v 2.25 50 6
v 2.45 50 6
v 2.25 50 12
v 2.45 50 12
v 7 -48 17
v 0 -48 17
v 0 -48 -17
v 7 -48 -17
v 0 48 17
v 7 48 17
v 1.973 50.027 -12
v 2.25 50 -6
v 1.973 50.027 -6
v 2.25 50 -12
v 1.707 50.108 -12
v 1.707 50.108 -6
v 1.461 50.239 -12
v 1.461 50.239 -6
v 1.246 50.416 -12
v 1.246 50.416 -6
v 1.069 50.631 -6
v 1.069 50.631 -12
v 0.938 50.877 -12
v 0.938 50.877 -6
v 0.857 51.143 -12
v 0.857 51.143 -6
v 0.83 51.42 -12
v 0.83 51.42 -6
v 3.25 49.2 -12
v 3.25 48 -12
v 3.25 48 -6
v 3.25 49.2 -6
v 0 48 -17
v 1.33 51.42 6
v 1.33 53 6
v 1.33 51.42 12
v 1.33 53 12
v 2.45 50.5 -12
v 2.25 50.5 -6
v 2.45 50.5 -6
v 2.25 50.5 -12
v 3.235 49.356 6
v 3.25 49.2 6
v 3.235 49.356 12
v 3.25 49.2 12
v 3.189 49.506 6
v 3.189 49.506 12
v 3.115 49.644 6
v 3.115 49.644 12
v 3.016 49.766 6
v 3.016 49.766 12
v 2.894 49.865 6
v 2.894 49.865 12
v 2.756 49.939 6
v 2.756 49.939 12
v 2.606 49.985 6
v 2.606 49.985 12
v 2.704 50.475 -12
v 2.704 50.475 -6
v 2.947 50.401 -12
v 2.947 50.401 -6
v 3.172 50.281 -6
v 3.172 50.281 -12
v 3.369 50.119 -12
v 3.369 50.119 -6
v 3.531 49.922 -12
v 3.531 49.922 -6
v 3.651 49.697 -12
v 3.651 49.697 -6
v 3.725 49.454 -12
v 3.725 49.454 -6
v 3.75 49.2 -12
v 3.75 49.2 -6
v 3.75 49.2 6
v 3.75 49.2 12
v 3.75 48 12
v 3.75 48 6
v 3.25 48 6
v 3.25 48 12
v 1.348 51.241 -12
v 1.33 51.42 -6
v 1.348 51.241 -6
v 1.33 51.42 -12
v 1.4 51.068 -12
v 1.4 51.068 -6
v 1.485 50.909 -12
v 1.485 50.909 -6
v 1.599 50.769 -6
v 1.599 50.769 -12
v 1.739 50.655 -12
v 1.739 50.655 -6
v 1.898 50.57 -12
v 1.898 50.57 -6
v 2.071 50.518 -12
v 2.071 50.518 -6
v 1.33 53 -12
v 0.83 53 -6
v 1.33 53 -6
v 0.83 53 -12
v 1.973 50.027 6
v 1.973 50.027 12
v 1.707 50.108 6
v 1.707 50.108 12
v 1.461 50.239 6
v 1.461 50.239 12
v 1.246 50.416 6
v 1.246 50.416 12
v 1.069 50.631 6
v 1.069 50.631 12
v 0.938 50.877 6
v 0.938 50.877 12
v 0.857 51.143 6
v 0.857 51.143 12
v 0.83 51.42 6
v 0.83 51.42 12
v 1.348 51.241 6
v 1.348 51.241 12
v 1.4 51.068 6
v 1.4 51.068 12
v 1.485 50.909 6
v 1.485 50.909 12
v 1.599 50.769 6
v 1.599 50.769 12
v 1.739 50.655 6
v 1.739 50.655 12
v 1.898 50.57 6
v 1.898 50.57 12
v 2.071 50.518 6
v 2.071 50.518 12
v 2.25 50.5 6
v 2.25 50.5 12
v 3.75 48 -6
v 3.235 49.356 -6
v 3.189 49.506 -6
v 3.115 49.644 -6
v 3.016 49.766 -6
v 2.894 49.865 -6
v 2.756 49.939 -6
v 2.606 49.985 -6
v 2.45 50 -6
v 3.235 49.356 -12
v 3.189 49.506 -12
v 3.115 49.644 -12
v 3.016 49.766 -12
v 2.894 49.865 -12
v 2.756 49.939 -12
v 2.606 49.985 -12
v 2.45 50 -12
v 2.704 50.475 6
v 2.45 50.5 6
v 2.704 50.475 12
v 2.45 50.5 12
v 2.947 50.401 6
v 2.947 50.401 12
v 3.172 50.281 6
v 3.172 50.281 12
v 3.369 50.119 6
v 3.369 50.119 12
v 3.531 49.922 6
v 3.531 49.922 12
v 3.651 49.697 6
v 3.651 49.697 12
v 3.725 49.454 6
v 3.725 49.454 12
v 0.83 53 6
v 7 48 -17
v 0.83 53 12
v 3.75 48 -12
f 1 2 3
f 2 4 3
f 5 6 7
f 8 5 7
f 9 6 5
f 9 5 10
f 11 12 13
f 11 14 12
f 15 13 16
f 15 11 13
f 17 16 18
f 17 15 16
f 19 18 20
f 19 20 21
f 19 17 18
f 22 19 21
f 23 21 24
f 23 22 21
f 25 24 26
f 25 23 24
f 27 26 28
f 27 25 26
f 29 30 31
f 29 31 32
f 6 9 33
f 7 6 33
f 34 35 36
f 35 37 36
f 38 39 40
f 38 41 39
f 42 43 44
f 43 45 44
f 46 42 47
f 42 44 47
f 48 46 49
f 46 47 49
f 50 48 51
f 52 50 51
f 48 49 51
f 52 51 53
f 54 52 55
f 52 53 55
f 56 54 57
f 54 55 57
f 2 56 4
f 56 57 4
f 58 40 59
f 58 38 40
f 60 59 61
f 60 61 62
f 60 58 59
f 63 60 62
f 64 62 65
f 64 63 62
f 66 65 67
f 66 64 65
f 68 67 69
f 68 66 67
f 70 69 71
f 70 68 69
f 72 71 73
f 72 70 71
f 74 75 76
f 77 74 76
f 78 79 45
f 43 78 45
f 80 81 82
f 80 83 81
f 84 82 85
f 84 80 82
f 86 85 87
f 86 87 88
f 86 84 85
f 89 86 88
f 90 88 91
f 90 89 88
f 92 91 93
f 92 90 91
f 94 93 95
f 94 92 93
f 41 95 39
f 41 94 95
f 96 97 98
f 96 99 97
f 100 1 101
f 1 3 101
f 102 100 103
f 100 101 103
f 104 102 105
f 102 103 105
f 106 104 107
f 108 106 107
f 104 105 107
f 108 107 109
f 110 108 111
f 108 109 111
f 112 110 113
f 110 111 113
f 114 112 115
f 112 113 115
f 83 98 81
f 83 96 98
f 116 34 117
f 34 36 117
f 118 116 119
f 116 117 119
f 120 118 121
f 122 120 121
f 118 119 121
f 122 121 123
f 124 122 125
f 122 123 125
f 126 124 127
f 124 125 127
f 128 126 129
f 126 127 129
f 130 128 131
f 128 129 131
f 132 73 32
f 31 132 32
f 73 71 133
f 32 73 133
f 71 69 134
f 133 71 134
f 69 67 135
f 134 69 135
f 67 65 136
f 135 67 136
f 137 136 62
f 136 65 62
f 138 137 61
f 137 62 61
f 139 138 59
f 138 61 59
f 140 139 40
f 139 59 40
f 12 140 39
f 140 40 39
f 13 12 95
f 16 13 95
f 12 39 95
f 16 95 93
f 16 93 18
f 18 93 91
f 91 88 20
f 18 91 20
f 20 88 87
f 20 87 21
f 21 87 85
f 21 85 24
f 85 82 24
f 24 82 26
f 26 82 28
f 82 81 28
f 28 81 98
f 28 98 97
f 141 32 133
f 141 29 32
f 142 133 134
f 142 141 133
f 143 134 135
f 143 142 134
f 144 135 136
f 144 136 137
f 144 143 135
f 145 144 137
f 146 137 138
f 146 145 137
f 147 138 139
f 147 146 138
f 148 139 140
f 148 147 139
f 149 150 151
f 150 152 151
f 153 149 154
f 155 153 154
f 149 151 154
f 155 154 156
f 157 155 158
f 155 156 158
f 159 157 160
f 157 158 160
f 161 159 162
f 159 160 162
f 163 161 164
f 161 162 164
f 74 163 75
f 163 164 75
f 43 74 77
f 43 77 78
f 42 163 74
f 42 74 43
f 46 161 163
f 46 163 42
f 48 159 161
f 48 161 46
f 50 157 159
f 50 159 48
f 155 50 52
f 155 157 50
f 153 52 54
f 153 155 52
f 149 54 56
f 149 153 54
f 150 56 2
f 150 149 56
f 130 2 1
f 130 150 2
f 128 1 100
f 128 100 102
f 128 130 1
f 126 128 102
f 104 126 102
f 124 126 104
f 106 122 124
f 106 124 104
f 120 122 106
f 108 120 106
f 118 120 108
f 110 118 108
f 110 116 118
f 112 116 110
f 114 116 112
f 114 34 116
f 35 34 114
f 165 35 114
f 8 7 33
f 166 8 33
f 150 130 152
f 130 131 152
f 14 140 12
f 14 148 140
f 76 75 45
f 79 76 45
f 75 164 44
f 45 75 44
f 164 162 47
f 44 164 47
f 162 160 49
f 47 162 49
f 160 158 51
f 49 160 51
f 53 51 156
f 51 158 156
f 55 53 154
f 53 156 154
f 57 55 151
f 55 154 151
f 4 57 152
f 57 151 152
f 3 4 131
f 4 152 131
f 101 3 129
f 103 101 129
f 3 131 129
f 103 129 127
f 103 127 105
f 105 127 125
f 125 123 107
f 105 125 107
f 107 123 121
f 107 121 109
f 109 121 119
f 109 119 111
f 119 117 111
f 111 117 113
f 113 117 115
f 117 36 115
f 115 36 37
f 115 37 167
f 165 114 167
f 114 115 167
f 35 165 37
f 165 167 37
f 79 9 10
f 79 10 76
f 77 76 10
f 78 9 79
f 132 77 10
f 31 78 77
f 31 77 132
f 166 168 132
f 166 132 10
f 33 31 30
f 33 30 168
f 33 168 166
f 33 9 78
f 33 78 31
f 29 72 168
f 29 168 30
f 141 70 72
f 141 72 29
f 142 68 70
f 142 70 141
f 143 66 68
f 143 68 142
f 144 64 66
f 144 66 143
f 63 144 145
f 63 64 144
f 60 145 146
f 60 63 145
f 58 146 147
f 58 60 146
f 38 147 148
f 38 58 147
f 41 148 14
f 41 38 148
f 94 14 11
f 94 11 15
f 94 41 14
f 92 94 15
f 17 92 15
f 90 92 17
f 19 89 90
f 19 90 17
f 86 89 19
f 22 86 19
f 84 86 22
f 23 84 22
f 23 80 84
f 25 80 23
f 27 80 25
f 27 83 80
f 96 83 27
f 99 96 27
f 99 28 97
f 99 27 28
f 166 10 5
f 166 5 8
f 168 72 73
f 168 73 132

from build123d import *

# Parameters (mm, degrees)
SKETCH_1_W      = 34
SKETCH_1_H      = 96
EXTRUDE_1_DEPTH = 7
EXTRUDE_2_DEPTH = 3


with BuildPart() as part:
    # 草图1 → 凸台-拉伸1 (new body)
    with BuildSketch(Plane(origin=(0, 0, 0), x_dir=(0, 0, -1), z_dir=(1, 0, 0))):
        Rectangle(SKETCH_1_W, SKETCH_1_H)
    extrude(amount=EXTRUDE_1_DEPTH)

    # 草图2 → 凸台-拉伸2 (add, symmetric)
    with BuildSketch(Plane.XY.offset(9)):
        with BuildLine():
            Line((3.25, 48), (3.25, 49.2))
            ThreePointArc((3.25, 49.2), (3.015685425, 49.765685425), (2.45, 50))
            Line((2.45, 50), (2.25, 50))
            ThreePointArc((2.25, 50), (1.245908371, 50.415908371), (0.83, 51.42))
            Line((0.83, 51.42), (0.83, 53))
            Line((0.83, 53), (1.33, 53))
            Line((1.33, 53), (1.33, 51.42))
            ThreePointArc((1.33, 51.42), (1.599461761, 50.769461761), (2.25, 50.5))
            Line((2.25, 50.5), (2.45, 50.5))
            ThreePointArc((2.45, 50.5), (3.369238816, 50.119238816), (3.75, 49.2))
            Line((3.75, 49.2), (3.75, 48))
            Line((3.75, 48), (3.25, 48))
        make_face()
    extrude_2 = extrude(amount=EXTRUDE_2_DEPTH, both=True)

    # 镜向1: 凸台-拉伸2 across plane
    add(extrude_2.mirror(Plane.XY))


solid = part.part
